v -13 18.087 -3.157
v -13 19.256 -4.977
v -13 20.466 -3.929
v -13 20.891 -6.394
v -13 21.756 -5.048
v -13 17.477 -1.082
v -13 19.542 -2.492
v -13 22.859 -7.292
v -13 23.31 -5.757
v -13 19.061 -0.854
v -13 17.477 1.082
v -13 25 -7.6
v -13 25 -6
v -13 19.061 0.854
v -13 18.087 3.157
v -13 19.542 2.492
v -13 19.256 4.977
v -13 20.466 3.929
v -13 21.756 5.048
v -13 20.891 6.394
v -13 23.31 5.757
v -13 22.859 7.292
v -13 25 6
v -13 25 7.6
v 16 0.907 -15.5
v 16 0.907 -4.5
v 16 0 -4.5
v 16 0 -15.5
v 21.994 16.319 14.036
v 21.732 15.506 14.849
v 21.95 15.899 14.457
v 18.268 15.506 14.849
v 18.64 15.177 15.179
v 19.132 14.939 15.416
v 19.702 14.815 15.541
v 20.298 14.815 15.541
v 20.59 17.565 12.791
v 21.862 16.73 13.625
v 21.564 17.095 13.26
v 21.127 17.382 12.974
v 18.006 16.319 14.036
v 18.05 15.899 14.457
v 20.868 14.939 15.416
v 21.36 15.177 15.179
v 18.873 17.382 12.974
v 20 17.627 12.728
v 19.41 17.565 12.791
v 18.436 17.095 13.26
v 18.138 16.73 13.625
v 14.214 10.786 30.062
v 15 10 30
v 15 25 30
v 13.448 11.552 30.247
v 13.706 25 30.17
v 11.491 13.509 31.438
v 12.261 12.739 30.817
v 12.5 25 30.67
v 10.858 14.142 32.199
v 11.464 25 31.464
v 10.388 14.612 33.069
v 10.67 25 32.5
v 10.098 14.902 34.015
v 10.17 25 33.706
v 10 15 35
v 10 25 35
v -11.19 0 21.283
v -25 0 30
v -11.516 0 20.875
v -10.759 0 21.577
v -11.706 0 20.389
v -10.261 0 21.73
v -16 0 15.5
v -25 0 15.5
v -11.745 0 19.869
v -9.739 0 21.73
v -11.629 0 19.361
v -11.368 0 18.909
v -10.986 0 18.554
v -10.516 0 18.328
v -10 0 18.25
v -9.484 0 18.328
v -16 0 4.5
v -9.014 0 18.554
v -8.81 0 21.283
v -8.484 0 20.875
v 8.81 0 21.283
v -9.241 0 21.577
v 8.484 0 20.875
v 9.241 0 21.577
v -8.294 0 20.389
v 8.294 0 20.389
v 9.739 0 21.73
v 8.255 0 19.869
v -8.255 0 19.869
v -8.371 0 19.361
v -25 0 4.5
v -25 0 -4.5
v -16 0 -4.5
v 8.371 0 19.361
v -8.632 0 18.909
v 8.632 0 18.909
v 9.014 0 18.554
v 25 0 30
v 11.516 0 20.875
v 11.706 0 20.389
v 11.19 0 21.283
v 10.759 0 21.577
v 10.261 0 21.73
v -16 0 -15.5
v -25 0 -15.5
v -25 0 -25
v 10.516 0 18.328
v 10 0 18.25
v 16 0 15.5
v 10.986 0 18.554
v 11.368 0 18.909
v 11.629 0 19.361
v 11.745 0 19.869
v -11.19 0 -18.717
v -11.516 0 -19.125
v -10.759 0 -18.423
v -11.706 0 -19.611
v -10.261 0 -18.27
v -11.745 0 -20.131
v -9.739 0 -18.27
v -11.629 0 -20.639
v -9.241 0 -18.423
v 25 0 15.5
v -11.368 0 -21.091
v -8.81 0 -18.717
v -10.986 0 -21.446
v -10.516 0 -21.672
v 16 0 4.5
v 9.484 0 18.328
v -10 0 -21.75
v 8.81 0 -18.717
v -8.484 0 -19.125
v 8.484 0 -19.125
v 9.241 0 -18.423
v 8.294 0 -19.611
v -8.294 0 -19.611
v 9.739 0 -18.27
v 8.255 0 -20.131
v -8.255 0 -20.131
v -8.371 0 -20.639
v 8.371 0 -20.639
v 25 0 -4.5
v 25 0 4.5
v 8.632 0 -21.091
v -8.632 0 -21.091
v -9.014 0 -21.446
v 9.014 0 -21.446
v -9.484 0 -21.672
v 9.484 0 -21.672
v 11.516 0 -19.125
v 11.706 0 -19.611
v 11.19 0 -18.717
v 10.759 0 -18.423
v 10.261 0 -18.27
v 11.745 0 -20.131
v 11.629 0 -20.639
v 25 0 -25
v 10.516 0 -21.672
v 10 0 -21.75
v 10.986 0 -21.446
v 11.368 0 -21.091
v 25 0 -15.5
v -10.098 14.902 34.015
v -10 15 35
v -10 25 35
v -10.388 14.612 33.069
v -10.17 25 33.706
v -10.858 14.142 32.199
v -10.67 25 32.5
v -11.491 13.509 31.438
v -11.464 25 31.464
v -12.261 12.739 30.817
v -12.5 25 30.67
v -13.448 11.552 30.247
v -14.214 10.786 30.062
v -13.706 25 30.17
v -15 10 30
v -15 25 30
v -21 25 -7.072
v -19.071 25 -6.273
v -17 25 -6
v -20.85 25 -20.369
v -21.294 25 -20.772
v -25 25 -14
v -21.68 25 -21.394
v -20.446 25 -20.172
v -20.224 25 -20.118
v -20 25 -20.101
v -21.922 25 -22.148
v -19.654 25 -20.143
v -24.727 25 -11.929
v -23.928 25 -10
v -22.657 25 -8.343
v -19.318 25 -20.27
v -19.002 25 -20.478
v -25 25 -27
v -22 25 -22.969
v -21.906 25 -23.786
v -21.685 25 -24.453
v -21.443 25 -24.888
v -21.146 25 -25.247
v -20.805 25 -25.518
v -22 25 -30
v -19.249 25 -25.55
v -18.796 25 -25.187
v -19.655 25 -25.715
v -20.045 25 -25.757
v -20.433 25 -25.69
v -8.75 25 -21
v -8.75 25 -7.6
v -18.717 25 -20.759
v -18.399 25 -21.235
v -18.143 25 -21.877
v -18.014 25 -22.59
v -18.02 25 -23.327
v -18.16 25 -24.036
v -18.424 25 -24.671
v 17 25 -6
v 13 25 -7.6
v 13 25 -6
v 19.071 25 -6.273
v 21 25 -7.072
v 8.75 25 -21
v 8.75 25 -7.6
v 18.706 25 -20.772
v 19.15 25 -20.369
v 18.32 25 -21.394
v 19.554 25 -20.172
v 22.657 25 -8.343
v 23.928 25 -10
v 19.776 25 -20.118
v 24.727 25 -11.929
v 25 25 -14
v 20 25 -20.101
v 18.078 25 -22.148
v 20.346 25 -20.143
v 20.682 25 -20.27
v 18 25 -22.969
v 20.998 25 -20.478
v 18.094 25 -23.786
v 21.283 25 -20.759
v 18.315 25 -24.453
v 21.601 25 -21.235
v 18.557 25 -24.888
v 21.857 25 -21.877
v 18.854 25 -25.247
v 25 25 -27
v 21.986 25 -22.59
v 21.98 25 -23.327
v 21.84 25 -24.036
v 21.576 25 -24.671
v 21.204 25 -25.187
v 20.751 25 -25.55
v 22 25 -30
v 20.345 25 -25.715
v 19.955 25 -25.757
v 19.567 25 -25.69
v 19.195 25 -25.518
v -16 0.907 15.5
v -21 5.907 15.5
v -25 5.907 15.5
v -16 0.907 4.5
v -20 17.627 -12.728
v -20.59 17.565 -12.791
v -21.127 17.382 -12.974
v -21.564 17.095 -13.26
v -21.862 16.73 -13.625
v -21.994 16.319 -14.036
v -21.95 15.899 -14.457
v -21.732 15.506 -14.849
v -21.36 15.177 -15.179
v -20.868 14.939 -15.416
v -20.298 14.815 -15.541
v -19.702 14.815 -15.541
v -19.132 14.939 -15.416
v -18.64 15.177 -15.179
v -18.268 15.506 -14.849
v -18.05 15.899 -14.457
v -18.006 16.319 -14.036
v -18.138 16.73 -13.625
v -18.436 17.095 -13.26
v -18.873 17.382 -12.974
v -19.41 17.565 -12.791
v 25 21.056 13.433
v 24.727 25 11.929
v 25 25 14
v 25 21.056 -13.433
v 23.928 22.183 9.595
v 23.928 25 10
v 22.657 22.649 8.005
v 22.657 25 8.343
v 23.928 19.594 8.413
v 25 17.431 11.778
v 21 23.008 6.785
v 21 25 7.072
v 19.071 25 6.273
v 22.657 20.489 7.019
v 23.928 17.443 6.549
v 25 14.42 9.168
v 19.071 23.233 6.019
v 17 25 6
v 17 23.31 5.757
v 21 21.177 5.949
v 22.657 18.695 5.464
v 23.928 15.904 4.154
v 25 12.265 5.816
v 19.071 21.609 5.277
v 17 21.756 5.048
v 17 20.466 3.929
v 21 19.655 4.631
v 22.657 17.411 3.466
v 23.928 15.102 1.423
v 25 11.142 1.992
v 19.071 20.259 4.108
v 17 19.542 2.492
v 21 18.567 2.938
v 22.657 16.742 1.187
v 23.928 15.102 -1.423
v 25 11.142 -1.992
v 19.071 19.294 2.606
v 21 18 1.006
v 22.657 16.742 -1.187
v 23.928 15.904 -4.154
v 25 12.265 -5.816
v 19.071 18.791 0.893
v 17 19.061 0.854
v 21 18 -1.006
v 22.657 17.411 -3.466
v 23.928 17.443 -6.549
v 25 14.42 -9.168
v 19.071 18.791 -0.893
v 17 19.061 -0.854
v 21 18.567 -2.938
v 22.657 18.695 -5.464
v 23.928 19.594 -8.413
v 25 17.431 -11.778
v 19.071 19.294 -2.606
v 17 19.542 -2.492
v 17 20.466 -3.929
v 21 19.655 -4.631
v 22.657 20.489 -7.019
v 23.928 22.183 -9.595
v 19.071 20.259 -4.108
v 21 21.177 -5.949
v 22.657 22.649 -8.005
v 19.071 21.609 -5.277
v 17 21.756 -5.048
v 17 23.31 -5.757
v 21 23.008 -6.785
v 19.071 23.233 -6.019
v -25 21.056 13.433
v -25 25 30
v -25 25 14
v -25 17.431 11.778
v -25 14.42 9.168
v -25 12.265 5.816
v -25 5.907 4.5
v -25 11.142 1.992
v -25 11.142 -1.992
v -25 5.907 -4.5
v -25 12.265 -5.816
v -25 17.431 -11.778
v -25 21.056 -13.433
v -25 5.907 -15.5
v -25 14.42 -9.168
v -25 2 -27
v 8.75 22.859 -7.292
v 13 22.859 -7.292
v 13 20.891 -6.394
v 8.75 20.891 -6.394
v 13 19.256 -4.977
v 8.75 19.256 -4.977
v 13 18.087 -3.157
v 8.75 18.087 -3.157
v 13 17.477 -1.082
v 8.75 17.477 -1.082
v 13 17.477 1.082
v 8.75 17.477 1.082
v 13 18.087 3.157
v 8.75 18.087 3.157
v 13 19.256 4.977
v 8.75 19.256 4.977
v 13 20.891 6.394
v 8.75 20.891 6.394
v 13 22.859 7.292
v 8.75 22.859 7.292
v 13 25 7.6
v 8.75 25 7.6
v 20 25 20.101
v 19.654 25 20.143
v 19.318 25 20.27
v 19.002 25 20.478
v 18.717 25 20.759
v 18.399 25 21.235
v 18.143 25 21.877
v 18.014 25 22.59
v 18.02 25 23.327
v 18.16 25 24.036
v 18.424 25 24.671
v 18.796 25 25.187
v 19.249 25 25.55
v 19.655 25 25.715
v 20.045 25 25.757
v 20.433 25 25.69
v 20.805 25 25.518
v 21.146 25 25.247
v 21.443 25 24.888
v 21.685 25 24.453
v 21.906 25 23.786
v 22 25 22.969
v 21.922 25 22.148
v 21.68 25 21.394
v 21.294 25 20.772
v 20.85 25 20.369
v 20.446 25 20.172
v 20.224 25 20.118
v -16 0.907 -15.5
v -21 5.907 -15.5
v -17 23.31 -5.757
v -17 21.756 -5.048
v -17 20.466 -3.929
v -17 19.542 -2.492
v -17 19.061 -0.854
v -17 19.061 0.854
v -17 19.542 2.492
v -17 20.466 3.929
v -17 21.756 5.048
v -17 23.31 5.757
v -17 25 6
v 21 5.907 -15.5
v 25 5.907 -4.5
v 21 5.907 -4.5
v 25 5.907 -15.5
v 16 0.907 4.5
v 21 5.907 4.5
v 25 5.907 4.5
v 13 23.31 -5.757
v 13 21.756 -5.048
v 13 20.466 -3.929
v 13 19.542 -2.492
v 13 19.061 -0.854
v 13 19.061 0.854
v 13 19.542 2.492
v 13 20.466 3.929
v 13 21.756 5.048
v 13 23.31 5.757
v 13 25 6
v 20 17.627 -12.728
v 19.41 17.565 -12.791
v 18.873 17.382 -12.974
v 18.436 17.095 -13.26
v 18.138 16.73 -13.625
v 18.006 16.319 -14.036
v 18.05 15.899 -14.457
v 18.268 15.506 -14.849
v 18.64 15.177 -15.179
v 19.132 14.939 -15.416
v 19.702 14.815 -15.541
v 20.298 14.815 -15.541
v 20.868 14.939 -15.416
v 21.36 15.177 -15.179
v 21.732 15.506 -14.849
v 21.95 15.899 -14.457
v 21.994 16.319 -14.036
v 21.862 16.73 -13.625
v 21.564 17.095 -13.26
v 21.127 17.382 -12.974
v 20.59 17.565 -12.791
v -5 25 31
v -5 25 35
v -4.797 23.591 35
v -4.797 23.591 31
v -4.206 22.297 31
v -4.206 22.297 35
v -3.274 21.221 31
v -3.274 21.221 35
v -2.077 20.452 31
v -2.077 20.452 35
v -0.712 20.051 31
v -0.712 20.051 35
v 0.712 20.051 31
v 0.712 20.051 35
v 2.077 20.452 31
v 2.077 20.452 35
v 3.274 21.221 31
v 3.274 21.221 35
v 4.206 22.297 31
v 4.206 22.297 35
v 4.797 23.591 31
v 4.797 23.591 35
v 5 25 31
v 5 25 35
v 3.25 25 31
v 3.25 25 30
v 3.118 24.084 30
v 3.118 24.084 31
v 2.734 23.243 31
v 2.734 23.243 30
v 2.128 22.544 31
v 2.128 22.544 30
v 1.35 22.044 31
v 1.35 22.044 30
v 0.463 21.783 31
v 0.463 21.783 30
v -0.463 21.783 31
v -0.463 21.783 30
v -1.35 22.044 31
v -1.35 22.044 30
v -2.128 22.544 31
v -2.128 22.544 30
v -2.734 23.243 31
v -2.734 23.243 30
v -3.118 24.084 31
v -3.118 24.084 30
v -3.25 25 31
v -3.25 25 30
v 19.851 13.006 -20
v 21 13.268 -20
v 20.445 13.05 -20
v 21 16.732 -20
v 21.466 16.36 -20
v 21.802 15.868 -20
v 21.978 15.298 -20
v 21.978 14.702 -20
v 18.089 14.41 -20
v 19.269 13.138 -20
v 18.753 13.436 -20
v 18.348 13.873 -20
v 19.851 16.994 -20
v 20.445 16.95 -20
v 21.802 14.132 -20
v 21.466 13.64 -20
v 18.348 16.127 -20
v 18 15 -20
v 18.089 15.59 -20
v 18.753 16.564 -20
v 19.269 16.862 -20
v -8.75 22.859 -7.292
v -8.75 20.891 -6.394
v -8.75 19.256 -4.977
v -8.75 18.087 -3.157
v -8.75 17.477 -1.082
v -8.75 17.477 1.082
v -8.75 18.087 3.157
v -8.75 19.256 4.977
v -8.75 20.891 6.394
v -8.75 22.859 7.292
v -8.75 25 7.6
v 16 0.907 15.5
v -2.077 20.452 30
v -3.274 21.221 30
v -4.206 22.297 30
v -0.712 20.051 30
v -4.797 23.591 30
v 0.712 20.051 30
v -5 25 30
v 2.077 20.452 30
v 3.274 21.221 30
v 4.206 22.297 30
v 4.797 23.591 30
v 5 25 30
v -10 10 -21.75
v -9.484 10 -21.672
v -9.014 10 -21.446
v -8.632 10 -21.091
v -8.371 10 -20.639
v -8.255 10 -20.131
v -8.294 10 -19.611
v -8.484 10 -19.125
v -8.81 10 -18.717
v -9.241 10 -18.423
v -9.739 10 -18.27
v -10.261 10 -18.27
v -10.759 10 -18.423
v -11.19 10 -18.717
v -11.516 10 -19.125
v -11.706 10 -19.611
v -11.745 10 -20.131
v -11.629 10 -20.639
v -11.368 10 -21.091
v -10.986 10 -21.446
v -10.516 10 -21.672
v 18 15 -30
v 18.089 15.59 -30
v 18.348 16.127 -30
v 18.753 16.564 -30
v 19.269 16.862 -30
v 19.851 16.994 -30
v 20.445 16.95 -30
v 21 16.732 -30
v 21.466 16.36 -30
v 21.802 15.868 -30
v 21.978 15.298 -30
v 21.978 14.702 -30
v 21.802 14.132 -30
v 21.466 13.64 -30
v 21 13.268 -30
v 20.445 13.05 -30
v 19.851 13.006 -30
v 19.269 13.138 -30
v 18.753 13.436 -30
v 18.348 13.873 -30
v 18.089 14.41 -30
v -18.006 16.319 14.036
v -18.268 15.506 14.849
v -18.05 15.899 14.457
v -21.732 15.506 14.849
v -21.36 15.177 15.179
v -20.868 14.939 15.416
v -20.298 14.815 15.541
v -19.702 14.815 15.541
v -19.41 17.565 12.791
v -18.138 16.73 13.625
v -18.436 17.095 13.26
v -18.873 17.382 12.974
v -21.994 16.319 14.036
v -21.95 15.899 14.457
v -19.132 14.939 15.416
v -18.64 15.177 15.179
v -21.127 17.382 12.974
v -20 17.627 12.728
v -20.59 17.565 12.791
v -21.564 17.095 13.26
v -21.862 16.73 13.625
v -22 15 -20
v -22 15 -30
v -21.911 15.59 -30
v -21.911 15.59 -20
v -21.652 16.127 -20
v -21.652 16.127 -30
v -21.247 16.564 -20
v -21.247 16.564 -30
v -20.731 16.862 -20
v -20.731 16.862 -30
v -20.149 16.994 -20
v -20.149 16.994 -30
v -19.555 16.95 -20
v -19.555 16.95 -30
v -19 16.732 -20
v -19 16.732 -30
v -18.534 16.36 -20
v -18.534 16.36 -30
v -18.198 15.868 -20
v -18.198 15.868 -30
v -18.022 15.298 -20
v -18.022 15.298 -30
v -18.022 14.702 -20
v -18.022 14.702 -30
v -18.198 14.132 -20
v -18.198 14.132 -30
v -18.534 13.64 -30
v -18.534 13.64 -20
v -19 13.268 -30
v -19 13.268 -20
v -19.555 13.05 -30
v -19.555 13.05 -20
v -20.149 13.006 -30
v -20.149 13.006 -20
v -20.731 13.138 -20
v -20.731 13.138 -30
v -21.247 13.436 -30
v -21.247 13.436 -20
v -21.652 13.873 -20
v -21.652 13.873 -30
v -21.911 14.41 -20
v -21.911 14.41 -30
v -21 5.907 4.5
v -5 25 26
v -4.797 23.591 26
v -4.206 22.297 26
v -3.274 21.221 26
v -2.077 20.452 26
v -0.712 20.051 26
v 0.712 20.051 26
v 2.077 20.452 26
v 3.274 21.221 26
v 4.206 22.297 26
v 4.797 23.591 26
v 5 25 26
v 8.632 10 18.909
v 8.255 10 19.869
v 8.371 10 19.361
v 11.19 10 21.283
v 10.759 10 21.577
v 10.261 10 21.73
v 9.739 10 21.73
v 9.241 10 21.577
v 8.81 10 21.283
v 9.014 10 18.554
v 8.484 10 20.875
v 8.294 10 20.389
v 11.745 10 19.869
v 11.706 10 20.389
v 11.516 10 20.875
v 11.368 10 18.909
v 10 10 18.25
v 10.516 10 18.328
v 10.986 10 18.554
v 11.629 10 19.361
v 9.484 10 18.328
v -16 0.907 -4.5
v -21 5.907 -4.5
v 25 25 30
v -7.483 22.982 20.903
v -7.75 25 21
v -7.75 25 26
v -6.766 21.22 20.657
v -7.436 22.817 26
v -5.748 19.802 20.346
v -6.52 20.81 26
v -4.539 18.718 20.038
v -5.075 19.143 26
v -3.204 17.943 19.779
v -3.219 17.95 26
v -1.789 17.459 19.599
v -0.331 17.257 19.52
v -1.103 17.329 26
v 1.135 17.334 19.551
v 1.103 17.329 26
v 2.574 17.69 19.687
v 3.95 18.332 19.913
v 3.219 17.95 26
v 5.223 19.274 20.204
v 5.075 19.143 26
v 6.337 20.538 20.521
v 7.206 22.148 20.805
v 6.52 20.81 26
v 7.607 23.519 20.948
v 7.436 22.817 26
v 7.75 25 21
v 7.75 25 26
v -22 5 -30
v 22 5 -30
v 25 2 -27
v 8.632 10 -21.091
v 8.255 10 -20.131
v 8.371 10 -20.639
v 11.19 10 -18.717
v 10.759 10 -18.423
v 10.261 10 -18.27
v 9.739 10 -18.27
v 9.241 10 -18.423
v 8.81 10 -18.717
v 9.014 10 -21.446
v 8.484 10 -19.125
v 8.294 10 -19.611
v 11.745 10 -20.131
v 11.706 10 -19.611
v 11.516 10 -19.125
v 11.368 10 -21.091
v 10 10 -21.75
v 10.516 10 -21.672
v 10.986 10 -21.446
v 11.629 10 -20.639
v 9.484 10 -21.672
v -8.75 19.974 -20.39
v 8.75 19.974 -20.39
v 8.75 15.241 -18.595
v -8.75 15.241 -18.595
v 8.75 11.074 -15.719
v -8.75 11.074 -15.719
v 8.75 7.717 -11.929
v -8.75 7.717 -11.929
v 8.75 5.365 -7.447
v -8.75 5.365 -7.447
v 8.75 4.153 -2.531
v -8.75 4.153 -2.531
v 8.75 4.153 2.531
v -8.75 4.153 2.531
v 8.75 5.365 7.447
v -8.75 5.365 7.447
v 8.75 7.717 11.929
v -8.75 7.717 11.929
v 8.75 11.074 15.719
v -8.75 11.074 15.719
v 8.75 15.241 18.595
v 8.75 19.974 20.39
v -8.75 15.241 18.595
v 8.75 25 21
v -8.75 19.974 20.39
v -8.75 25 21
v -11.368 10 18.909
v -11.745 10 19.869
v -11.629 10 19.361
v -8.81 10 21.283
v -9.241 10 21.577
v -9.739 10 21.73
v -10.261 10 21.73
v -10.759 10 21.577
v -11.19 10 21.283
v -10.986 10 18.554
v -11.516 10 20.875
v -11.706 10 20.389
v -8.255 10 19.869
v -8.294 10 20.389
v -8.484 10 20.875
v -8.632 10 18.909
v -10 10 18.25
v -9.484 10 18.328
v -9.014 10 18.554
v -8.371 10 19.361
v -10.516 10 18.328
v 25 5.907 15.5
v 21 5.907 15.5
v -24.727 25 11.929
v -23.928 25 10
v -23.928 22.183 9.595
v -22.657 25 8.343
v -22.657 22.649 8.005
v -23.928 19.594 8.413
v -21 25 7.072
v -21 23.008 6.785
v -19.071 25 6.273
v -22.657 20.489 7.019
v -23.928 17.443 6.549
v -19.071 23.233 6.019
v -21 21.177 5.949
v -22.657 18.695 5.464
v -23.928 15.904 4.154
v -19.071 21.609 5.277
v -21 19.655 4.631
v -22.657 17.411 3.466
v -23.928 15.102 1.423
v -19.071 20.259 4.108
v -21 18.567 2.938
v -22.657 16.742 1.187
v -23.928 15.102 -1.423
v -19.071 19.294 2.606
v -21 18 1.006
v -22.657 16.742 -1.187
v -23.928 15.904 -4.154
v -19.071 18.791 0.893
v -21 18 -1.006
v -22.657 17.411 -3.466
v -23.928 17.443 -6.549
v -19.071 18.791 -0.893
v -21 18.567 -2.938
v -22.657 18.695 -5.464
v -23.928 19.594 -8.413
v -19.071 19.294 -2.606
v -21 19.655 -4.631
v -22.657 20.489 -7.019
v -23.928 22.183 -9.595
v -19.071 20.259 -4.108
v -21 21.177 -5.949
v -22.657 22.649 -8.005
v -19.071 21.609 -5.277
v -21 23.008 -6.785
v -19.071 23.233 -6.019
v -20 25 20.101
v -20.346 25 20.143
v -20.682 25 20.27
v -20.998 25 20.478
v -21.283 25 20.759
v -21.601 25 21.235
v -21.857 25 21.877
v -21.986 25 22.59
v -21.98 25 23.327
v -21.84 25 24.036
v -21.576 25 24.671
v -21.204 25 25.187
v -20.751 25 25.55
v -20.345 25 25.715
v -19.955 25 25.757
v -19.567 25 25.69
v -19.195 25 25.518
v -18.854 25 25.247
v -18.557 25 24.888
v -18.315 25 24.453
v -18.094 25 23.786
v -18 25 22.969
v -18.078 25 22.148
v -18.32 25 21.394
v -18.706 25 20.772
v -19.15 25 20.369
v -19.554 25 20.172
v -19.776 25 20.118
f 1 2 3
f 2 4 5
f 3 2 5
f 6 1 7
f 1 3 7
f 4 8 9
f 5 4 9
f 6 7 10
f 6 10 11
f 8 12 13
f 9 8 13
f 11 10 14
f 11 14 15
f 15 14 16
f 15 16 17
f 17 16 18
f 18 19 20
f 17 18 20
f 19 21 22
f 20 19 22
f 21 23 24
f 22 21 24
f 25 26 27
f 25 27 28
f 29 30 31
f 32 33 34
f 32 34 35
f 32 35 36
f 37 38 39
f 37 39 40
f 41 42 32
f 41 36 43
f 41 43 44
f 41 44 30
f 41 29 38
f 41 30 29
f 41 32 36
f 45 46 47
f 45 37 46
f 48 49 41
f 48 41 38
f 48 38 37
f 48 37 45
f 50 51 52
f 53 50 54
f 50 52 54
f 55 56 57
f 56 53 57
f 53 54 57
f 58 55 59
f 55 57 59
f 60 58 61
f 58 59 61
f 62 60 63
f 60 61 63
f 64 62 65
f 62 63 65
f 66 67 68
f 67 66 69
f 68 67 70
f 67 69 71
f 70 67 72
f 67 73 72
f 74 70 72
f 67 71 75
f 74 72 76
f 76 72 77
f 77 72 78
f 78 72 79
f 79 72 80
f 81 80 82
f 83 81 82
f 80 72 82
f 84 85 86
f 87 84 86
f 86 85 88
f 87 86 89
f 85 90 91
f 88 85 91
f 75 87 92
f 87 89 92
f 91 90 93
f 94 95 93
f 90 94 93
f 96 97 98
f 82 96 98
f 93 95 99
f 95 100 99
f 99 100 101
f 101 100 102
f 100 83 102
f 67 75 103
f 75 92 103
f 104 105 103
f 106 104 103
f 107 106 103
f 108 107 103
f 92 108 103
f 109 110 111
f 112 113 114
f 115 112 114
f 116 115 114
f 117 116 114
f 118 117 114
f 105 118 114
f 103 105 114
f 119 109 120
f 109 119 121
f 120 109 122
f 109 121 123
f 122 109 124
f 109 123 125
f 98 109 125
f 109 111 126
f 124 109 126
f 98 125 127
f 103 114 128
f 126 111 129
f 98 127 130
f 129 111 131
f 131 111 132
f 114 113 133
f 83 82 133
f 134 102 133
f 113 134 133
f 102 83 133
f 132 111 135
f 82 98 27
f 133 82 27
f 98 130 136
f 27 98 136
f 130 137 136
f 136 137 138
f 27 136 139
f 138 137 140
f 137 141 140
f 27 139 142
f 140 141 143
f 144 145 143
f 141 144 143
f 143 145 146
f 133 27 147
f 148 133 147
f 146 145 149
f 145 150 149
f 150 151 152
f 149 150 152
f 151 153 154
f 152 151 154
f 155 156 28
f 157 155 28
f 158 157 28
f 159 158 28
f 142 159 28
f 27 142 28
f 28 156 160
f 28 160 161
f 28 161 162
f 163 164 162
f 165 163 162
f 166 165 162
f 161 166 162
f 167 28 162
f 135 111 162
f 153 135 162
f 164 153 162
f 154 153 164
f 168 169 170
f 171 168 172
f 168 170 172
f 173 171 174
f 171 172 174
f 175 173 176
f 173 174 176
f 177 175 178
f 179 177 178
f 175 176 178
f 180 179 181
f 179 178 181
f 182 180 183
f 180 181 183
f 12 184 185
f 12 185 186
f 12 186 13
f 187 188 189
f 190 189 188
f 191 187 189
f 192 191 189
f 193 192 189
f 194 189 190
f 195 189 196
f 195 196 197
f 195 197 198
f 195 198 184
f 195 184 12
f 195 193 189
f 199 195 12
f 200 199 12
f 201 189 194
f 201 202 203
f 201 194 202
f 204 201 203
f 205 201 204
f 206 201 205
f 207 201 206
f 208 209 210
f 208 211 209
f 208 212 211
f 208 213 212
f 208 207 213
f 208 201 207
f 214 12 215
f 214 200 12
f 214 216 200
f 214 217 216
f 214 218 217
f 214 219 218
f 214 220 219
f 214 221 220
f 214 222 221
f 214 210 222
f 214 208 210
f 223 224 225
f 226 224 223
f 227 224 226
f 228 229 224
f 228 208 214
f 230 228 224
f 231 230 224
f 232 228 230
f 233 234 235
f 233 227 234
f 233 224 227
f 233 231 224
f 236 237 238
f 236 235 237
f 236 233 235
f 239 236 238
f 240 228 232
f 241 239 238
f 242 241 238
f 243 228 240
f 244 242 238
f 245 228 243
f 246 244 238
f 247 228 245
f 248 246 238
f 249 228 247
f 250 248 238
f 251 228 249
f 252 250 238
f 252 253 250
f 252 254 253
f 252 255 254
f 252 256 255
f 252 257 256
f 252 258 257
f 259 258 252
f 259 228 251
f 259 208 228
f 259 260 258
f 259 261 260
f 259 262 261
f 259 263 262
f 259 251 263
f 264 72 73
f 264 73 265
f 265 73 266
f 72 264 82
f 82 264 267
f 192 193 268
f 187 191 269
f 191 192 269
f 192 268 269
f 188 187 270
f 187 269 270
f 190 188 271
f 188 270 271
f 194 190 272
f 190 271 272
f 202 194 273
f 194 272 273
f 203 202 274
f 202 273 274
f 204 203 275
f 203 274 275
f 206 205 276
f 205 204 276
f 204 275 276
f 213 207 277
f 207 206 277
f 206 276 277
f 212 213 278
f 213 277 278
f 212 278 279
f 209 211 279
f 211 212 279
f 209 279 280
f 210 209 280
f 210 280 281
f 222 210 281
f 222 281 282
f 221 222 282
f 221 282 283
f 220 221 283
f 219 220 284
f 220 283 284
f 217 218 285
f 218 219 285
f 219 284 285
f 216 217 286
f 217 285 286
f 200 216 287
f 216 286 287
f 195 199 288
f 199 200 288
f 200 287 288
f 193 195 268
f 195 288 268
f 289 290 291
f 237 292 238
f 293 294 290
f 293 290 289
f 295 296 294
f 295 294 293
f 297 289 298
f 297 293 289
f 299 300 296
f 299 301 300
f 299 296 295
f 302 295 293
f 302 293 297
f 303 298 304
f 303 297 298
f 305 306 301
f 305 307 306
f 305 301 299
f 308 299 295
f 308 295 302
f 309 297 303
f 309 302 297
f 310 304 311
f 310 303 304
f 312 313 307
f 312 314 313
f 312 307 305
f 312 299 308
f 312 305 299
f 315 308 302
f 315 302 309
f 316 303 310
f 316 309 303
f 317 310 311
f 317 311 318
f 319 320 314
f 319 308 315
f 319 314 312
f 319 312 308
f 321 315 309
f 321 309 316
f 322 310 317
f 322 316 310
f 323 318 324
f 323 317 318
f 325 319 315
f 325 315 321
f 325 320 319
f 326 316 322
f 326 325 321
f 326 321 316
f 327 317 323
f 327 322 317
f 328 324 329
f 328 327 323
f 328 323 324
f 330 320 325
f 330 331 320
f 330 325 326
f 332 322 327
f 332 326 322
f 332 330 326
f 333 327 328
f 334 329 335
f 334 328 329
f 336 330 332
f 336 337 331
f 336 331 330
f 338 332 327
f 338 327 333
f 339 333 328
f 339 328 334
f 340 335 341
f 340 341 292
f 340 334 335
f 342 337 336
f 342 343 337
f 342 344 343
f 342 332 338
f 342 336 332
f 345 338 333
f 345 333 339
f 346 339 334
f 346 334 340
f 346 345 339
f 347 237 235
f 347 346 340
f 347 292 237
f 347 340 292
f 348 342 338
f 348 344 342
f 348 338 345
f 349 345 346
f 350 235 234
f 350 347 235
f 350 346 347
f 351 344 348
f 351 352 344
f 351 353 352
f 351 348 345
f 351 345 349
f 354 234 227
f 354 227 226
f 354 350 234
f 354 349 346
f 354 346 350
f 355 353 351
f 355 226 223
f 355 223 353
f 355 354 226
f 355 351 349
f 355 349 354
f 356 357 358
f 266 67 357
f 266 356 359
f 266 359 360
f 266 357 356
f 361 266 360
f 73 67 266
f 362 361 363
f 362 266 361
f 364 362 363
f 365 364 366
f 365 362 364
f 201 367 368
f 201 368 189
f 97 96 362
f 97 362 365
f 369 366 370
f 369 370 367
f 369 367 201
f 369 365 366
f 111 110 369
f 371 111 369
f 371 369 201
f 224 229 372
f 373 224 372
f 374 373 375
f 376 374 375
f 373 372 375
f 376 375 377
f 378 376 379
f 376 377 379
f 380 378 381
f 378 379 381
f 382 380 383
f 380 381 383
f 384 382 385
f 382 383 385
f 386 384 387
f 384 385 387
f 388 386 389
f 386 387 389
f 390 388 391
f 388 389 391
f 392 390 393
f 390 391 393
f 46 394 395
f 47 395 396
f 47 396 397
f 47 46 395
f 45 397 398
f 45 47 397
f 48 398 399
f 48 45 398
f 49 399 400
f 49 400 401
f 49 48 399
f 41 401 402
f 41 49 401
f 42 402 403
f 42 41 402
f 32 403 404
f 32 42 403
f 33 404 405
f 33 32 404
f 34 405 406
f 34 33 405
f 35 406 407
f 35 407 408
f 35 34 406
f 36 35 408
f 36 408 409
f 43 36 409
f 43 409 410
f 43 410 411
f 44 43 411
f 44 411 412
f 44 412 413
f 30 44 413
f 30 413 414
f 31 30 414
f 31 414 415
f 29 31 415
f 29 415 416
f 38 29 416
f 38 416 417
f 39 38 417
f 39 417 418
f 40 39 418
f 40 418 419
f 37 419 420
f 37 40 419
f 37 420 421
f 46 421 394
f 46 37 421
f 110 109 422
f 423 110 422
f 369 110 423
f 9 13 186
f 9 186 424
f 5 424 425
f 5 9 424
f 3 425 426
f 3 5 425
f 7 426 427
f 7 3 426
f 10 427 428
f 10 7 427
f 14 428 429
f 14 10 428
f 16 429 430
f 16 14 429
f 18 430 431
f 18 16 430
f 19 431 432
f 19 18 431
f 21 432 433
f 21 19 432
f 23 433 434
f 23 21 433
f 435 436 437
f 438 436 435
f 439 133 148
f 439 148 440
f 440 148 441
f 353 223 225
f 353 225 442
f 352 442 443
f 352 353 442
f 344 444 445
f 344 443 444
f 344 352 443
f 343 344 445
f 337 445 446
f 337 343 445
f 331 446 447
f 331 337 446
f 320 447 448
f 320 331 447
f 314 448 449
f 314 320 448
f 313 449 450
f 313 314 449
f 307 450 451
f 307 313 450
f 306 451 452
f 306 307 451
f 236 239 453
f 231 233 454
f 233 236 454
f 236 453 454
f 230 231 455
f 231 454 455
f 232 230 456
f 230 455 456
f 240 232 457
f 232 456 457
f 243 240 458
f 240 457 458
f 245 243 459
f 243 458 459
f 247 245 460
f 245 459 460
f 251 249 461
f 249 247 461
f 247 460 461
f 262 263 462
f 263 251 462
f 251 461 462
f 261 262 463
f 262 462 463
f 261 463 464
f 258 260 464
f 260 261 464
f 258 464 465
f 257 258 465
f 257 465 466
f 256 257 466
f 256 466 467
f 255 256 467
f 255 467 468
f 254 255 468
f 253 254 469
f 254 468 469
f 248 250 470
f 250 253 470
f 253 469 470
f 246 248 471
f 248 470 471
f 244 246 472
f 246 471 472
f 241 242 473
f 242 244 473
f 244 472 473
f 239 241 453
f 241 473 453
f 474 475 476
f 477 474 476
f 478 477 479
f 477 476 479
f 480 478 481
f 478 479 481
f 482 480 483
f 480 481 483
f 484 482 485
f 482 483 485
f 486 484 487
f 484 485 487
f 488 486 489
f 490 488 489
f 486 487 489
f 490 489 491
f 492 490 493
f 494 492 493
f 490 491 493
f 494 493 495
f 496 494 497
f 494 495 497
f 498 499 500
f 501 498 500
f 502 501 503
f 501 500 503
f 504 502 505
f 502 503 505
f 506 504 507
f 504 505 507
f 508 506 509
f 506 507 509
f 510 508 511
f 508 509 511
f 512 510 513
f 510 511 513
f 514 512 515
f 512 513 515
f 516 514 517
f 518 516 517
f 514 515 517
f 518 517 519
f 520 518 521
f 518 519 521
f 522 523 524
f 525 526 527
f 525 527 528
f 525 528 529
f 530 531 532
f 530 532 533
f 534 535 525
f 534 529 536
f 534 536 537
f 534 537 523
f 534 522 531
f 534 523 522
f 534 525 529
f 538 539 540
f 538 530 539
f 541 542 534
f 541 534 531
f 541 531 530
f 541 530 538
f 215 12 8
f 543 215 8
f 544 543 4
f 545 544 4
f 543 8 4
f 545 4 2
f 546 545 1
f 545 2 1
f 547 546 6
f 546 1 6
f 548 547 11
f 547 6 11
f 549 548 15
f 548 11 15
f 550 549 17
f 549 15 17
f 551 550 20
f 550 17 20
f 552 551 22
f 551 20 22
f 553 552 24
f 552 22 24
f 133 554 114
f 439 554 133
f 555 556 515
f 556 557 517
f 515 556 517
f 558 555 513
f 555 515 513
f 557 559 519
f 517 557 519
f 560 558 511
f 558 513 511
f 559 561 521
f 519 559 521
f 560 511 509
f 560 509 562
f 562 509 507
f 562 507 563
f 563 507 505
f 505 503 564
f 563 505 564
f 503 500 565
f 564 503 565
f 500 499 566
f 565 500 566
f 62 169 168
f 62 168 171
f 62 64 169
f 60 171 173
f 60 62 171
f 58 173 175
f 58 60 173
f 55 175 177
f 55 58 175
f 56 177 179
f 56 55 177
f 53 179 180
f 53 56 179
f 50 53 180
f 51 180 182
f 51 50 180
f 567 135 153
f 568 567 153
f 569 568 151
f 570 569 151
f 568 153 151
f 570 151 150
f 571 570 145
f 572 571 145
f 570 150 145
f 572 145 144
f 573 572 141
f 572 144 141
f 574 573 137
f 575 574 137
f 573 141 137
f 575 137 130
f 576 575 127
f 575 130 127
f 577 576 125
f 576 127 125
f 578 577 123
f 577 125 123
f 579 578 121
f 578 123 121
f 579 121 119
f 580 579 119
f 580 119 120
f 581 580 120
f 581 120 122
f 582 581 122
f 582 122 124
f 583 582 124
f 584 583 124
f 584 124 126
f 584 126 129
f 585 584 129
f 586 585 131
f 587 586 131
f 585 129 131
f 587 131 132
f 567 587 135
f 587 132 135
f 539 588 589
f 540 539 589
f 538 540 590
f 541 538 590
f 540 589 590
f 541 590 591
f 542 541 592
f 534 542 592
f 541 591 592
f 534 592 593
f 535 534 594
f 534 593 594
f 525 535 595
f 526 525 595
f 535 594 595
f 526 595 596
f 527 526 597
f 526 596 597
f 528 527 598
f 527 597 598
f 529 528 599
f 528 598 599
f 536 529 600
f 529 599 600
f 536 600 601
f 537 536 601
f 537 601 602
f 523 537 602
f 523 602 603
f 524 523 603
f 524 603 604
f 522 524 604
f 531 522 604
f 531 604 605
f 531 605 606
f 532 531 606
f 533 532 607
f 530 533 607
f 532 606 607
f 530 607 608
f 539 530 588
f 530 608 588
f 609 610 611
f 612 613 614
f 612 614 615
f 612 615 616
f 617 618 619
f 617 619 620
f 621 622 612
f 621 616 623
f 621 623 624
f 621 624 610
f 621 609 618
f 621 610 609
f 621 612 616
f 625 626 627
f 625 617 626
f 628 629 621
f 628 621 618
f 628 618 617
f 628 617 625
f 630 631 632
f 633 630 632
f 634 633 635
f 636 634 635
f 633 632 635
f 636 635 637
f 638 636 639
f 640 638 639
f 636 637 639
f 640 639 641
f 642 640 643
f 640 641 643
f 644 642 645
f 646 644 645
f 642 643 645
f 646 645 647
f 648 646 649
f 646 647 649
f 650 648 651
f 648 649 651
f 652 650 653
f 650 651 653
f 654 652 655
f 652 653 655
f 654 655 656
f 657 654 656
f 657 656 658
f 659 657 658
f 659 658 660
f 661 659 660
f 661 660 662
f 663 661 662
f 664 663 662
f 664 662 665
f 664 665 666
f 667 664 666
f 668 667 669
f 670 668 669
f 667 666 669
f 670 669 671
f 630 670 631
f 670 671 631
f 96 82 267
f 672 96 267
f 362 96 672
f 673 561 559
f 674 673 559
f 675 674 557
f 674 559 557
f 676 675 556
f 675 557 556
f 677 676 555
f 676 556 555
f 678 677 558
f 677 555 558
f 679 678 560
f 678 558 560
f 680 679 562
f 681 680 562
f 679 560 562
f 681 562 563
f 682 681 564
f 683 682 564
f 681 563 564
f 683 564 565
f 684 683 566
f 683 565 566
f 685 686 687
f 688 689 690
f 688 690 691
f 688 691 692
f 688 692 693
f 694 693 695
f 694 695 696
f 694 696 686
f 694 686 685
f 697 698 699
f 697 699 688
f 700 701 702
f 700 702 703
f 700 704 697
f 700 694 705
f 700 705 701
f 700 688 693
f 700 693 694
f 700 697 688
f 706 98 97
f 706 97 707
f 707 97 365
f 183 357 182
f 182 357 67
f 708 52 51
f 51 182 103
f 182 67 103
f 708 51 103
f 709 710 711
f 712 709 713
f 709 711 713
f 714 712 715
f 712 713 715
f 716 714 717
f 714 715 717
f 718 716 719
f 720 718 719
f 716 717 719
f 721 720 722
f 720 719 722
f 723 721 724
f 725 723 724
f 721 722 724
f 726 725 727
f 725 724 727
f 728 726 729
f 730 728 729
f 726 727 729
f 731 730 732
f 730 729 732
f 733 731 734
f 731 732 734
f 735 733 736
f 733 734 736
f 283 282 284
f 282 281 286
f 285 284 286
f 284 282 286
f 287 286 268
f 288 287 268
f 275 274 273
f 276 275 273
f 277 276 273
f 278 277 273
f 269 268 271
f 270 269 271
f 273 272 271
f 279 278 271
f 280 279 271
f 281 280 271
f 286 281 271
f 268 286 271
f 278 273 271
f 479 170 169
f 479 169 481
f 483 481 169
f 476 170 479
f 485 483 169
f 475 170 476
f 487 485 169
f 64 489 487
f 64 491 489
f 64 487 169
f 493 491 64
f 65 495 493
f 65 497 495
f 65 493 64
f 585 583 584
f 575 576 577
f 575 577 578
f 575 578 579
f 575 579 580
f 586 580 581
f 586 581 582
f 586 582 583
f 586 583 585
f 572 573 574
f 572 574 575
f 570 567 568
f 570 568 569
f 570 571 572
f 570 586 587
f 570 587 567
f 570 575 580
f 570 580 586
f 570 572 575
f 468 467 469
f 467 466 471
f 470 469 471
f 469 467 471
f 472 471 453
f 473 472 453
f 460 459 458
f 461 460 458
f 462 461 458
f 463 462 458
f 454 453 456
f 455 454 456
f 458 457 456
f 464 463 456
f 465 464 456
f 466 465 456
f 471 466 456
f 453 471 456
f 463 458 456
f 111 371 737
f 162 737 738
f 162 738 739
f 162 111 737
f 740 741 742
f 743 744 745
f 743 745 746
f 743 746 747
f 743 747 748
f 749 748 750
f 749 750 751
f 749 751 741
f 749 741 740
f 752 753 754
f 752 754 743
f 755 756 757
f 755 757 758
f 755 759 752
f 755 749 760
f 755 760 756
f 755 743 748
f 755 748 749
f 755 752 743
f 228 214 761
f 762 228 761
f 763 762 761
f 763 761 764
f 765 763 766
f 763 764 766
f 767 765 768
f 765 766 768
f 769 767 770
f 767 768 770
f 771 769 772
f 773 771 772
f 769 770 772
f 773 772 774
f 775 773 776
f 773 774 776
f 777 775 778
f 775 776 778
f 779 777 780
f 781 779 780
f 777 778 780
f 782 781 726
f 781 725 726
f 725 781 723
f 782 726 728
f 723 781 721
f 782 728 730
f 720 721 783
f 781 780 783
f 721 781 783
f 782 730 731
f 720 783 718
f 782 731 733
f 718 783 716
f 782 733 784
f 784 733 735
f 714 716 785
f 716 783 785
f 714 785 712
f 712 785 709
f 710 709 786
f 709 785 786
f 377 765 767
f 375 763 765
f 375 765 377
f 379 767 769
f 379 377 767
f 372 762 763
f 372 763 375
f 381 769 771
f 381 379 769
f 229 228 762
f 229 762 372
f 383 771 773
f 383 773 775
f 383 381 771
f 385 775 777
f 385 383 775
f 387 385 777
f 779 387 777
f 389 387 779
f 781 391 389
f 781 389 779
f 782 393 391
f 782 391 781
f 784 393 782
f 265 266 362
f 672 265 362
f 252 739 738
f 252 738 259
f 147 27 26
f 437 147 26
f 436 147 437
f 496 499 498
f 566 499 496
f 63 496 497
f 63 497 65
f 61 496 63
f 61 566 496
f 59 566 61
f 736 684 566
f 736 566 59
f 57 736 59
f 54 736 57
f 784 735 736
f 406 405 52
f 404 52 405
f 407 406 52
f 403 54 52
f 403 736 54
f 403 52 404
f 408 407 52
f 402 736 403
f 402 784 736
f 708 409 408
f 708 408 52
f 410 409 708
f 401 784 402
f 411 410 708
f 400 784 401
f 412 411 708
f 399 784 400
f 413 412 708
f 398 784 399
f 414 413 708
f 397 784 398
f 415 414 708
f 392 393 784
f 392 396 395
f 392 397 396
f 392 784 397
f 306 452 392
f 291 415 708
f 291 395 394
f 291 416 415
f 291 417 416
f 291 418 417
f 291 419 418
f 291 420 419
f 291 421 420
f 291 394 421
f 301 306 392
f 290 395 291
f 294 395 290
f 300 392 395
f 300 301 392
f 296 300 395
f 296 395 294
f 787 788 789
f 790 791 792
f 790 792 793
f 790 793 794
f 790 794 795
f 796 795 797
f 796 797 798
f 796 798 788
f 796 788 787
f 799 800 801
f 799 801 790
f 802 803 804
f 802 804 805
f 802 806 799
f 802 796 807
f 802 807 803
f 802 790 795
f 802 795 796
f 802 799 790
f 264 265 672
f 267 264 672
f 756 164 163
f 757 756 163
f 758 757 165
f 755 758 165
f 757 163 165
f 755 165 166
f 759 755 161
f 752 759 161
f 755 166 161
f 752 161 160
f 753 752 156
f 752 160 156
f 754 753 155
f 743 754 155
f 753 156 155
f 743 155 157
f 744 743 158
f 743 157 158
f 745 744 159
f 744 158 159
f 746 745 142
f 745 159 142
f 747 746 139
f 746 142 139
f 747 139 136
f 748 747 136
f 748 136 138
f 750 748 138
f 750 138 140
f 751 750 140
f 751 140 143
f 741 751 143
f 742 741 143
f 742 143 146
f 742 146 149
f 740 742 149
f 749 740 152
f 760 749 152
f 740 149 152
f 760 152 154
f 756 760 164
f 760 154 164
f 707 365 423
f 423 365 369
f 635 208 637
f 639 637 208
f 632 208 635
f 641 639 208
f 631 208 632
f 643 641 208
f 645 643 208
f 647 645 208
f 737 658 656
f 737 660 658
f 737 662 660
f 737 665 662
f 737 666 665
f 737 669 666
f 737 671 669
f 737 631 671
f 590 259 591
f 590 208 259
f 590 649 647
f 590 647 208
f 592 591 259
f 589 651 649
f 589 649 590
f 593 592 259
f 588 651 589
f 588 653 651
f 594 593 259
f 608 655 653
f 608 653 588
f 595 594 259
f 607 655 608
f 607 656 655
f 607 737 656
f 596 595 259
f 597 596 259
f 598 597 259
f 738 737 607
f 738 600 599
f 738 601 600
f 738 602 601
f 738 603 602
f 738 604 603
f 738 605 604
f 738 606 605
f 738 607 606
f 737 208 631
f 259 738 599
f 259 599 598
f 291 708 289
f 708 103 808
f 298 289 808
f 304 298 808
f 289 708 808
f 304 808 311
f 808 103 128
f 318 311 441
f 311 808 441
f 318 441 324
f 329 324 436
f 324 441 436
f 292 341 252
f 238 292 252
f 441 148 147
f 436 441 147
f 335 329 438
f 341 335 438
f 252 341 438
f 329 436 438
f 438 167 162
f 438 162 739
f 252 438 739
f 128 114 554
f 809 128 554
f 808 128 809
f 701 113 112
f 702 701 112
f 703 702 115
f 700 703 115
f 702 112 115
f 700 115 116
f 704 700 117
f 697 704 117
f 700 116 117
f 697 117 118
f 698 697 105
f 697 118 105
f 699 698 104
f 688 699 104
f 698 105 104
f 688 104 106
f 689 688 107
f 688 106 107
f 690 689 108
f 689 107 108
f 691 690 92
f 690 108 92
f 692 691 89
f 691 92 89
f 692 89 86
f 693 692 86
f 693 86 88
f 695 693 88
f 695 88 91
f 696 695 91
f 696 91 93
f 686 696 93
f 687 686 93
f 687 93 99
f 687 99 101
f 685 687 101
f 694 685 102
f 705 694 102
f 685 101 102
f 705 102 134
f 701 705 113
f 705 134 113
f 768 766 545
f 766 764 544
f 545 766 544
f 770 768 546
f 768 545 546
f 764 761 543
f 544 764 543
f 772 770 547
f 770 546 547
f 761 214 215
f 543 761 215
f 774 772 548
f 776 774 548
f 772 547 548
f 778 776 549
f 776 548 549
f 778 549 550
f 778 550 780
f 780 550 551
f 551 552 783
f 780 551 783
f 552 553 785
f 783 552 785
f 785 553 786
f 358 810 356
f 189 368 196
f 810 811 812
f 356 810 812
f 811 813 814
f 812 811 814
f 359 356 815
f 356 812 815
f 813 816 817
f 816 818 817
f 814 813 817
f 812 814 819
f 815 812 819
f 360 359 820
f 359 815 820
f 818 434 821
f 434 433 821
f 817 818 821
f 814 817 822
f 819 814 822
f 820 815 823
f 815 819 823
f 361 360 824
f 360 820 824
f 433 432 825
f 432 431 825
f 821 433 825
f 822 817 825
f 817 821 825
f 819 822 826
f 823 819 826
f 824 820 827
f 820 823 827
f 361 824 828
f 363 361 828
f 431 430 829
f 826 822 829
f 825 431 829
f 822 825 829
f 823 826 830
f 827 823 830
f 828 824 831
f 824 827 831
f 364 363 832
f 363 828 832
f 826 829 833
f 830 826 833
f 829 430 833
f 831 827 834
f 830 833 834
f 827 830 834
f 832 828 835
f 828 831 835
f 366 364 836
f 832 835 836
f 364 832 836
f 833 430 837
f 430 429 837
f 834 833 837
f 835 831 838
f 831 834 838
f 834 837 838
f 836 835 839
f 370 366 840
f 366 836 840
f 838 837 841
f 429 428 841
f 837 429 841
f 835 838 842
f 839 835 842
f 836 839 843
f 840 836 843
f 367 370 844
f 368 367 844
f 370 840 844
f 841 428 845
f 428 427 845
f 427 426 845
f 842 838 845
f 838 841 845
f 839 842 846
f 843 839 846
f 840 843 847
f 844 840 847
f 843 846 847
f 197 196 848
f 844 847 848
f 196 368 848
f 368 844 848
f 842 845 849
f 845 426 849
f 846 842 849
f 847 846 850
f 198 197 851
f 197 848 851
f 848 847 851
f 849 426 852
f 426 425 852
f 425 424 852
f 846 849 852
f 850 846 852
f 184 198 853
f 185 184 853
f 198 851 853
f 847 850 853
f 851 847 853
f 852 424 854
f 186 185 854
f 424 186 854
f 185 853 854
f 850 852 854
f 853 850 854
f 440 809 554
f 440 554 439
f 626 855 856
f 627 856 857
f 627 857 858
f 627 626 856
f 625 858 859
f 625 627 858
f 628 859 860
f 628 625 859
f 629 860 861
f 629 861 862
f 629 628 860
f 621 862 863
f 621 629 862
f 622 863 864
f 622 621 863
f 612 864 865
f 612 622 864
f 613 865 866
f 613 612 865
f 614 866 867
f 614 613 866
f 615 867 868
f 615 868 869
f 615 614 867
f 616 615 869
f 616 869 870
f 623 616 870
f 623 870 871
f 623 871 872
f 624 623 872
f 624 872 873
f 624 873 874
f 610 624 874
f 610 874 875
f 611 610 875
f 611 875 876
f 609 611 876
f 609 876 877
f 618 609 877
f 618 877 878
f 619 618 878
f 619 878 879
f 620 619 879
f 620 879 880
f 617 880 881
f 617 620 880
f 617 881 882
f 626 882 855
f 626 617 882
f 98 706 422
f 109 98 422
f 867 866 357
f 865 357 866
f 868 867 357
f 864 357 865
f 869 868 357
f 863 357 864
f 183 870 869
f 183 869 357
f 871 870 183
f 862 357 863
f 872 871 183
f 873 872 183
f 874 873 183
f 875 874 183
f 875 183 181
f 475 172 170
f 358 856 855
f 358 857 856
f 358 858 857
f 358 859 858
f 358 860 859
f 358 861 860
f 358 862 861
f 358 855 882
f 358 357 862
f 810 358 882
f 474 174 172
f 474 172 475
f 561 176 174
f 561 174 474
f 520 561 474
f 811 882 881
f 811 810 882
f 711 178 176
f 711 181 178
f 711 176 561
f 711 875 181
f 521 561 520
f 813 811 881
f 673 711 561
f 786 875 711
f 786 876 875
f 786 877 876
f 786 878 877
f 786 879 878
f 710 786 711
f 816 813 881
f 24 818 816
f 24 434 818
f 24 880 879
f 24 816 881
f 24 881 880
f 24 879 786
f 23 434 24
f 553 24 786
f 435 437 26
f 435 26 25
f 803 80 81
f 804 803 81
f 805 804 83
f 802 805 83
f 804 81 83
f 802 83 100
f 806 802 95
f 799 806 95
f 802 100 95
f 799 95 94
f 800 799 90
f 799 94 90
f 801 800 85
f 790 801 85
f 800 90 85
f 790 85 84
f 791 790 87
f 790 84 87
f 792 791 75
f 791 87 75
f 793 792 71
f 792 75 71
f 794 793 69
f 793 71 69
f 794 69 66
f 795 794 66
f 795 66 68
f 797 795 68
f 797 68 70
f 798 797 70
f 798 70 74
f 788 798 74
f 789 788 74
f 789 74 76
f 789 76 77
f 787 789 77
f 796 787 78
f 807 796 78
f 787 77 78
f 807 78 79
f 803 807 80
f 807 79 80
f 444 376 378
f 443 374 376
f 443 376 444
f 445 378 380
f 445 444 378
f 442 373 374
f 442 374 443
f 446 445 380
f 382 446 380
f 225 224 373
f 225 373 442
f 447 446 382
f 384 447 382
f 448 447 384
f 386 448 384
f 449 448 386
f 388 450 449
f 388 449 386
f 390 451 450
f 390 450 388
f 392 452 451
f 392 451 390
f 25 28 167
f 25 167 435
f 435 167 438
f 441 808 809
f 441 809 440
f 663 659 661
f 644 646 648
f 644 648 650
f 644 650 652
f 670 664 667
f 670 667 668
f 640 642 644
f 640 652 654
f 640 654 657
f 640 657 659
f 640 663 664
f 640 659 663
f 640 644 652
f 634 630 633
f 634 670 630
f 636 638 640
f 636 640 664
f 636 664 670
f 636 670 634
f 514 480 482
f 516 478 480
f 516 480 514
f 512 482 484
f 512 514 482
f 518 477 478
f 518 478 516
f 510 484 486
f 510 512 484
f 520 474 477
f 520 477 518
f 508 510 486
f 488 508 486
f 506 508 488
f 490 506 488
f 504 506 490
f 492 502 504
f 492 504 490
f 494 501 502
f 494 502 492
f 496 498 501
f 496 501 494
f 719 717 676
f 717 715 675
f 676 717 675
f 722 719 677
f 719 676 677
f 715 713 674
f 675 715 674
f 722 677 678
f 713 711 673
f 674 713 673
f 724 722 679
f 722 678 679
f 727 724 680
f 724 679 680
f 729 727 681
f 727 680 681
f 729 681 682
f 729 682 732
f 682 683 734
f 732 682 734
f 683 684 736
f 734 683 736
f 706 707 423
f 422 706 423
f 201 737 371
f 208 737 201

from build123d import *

# Parameters (mm, degrees)
SKETCH1_W                = 50
SKETCH1_H                = 60
BOSS_EXTRUDE1_DEPTH      = 25
CUT_EXTRUDE1_START       = -16.25
SKETCH2_R                = 21
CUT_EXTRUDE1_DEPTH       = 17.5
CUT_EXTRUDE2_START       = -12
SKETCH3_R                = 7.6
CUT_EXTRUDE2_DEPTH       = 26
SKETCH4_R                = 5
CUT_EXTRUDE3_DEPTH       = 4
SKETCH5_R                = 1.75
CUT_EXTRUDE4_DEPTH       = 10
CHAMFER1_SIZE            = 5
SKETCH6_R                = 2
CUT_EXTRUDE5_DEPTH       = 10
SKETCH7_W                = 11
SKETCH7_H                = 5.906734889
CUT_EXTRUDE6_DEPTH       = 9
CHAMFER2_SIZE            = 5
CHAMFER2_OF_MIRROR1_SIZE = 5
CHAMFER3_SIZE            = 3
CUT_EXTRUDE8_START       = 25
SKETCH10_R               = 2
CUT_EXTRUDE8_DEPTH       = 25.371044145
CUT_EXTRUDE10_DEPTH      = 64.442887702
CUT_EXTRUDE10_DEPTH_BACK = 64.442887702
SKETCH12_R               = 6
FILLET1_R                = 8
SKETCH16_R               = 7.75
CUT_EXTRUDE13_DEPTH      = 8
SKETCH17_W               = 20
SKETCH17_H               = 10
BOSS_EXTRUDE2_DEPTH      = 5
SKETCH18_R               = 3.25
CUT_EXTRUDE14_DEPTH      = 10
SKETCH19_R               = 5
CUT_EXTRUDE15_DEPTH      = 4
FILLET2_R                = 5


with BuildPart() as part:
    # Sketch1 → Boss-Extrude1 (new body)
    with BuildSketch(Plane(origin=(0, 0, 0), x_dir=(1, 0, 0), z_dir=(0, 1, 0))):
        Rectangle(SKETCH1_W, SKETCH1_H)
    extrude(amount=BOSS_EXTRUDE1_DEPTH)

    # Sketch2 → Cut-Extrude1 (cut)
    with BuildSketch(Plane.ZY.offset(25).offset(CUT_EXTRUDE1_START)):
        with Locations((0, 25)):
            Circle(SKETCH2_R)
    extrude(amount=-CUT_EXTRUDE1_DEPTH, mode=Mode.SUBTRACT)

    # Sketch3 → Cut-Extrude2 (cut)
    with BuildSketch(Plane.ZY.offset(25).offset(CUT_EXTRUDE2_START)):
        with Locations((0, 25)):
            Circle(SKETCH3_R)
    extrude(amount=-CUT_EXTRUDE2_DEPTH, mode=Mode.SUBTRACT)

    # Sketch4 → Cut-Extrude3 (cut)
    with BuildSketch(Plane.XY.offset(30)):
        with Locations((0, 25)):
            Circle(SKETCH4_R)
    extrude(amount=-CUT_EXTRUDE3_DEPTH, mode=Mode.SUBTRACT)

    # Sketch5 → Cut-Extrude4 (cut)
    with BuildSketch(Plane.XZ):
        with Locations(Location((-10, 20, 0), (0, 0, 270))):
            Circle(SKETCH5_R)
        with Locations(Location((10, 20, 0), (0, 0, 270))):
            Circle(SKETCH5_R)
        with Locations(Location((-10, -20, 0), (0, 0, 270))):
            Circle(SKETCH5_R)
        with Locations(Location((10, -20, 0), (0, 0, 270))):
            Circle(SKETCH5_R)
    extrude(amount=-CUT_EXTRUDE4_DEPTH, mode=Mode.SUBTRACT)

    # Chamfer1
    chamfer1_edges = [part.edges().sort_by_distance(p)[0] for p in [
        (0, 0, -30),
    ]]
    chamfer(chamfer1_edges, length=CHAMFER1_SIZE)

    # Sketch6 → Cut-Extrude5 (cut)
    with BuildSketch(Plane(origin=(0, 0, -30), x_dir=(-1, 0, 0), z_dir=(0, 0, -1))):
        with Locations((-20, 15)):
            Circle(SKETCH6_R)
        with Locations((20, 15)):
            Circle(SKETCH6_R)
    extrude(amount=-CUT_EXTRUDE5_DEPTH, mode=Mode.SUBTRACT)

    # Sketch7 → Cut-Extrude6 (cut)
    with BuildSketch(Plane(origin=(25, 0, 0), x_dir=(0, 0, -1), z_dir=(1, 0, 0))):
        with Locations((-10, 2.953367444)):
            Rectangle(SKETCH7_W, SKETCH7_H)
        with Locations((10, 2.953367444)):
            Rectangle(SKETCH7_W, SKETCH7_H)
    cut_extrude6 = extrude(amount=-CUT_EXTRUDE6_DEPTH, mode=Mode.SUBTRACT)

    # Chamfer2
    chamfer2_edges = [part.edges().sort_by_distance(p)[0] for p in [
        (16, 5.906734889, 10),
        (16, 5.906734889, -10),
    ]]
    chamfer(chamfer2_edges, length=CHAMFER2_SIZE)

    # Mirror1: Cut-Extrude6 across plane
    add(cut_extrude6.mirror(Plane(origin=(0, 0, 0), x_dir=(0, 0, 1), z_dir=(1, 0, 0))), mode=Mode.SUBTRACT)

    # Chamfer2 of Mirror1
    chamfer2_of_mirror1_edges = [part.edges().sort_by_distance(p)[0] for p in [
        (-16, 5.906734889, 10),
        (-16, 5.906734889, -10),
    ]]
    chamfer(chamfer2_of_mirror1_edges, length=CHAMFER2_OF_MIRROR1_SIZE)

    # Chamfer3
    chamfer3_edges = [part.edges().sort_by_distance(p)[0] for p in [
        (-25, 15, -30),
        (25, 15, -30),
    ]]
    chamfer(chamfer3_edges, length=CHAMFER3_SIZE - 0.0001)  # a hair under: the kernel refuses the full size

    # Sketch10 → Cut-Extrude8 (cut, through all)
    with BuildSketch(Plane(origin=(0, -2.5, -2.5), x_dir=(1, 0, 0), z_dir=(0, 0.7071067811865475, 0.7071067811865477)).offset(CUT_EXTRUDE8_START)):
        with Locations(Location((-20, 1.464466094, 0), (0, 0, 90))):
            Circle(SKETCH10_R)
        with Locations(Location((20, 1.464466094, 0), (0, 0, 90))):
            Circle(SKETCH10_R)
    cut_extrude8 = extrude(amount=CUT_EXTRUDE8_DEPTH, mode=Mode.SUBTRACT)

    # Mirror2: Cut-Extrude8 across plane
    add(cut_extrude8.mirror(Plane.XY), mode=Mode.SUBTRACT)

    # Sketch12 → Cut-Extrude10 (cut, two sides: drawn at the far end of the back side and taken through both)
    with BuildSketch(Plane.ZY.offset(25).offset(-CUT_EXTRUDE10_DEPTH_BACK)):
        with Locations((0, 25)):
            Circle(SKETCH12_R)
    extrude(amount=CUT_EXTRUDE10_DEPTH + CUT_EXTRUDE10_DEPTH_BACK, mode=Mode.SUBTRACT)

    # Fillet1
    fillet1_edges = [part.edges().sort_by_distance(p)[0] for p in [
        (25, 19, 0),
        (-25, 19, 0),
    ]]
    fillet(fillet1_edges, radius=FILLET1_R)

    # Sketch16 → Cut-Extrude13 (cut)
    with BuildSketch(Plane.XY.offset(26)):
        with Locations((0, 25)):
            Circle(SKETCH16_R)
    extrude(amount=-CUT_EXTRUDE13_DEPTH, mode=Mode.SUBTRACT)

    # Sketch17 → Boss-Extrude2 (add)
    with BuildSketch(Plane.XY.offset(30)):
        with Locations((0, 20)):
            Rectangle(SKETCH17_W, SKETCH17_H)
    extrude(amount=BOSS_EXTRUDE2_DEPTH)

    # Sketch18 → Cut-Extrude14 (cut)
    with BuildSketch(Plane(origin=(0, 0, 30), x_dir=(-1, 0, 0), z_dir=(0, 0, -1))):
        with Locations((0, 25)):
            Circle(SKETCH18_R)
    extrude(amount=-CUT_EXTRUDE14_DEPTH, mode=Mode.SUBTRACT)

    # Sketch19 → Cut-Extrude15 (cut)
    with BuildSketch(Plane.XY.offset(35)):
        with Locations((0, 25)):
            Circle(SKETCH19_R)
    extrude(amount=-CUT_EXTRUDE15_DEPTH, mode=Mode.SUBTRACT)

    # Fillet2
    fillet2_edges = [part.edges().sort_by_distance(p)[0] for p in [
        (-10, 20, 30),
        (0, 15, 30),
        (10, 20, 30),
    ]]
    fillet(fillet2_edges, radius=FILLET2_R - 0.0001)  # a hair under: the kernel refuses the full size


solid = part.part
